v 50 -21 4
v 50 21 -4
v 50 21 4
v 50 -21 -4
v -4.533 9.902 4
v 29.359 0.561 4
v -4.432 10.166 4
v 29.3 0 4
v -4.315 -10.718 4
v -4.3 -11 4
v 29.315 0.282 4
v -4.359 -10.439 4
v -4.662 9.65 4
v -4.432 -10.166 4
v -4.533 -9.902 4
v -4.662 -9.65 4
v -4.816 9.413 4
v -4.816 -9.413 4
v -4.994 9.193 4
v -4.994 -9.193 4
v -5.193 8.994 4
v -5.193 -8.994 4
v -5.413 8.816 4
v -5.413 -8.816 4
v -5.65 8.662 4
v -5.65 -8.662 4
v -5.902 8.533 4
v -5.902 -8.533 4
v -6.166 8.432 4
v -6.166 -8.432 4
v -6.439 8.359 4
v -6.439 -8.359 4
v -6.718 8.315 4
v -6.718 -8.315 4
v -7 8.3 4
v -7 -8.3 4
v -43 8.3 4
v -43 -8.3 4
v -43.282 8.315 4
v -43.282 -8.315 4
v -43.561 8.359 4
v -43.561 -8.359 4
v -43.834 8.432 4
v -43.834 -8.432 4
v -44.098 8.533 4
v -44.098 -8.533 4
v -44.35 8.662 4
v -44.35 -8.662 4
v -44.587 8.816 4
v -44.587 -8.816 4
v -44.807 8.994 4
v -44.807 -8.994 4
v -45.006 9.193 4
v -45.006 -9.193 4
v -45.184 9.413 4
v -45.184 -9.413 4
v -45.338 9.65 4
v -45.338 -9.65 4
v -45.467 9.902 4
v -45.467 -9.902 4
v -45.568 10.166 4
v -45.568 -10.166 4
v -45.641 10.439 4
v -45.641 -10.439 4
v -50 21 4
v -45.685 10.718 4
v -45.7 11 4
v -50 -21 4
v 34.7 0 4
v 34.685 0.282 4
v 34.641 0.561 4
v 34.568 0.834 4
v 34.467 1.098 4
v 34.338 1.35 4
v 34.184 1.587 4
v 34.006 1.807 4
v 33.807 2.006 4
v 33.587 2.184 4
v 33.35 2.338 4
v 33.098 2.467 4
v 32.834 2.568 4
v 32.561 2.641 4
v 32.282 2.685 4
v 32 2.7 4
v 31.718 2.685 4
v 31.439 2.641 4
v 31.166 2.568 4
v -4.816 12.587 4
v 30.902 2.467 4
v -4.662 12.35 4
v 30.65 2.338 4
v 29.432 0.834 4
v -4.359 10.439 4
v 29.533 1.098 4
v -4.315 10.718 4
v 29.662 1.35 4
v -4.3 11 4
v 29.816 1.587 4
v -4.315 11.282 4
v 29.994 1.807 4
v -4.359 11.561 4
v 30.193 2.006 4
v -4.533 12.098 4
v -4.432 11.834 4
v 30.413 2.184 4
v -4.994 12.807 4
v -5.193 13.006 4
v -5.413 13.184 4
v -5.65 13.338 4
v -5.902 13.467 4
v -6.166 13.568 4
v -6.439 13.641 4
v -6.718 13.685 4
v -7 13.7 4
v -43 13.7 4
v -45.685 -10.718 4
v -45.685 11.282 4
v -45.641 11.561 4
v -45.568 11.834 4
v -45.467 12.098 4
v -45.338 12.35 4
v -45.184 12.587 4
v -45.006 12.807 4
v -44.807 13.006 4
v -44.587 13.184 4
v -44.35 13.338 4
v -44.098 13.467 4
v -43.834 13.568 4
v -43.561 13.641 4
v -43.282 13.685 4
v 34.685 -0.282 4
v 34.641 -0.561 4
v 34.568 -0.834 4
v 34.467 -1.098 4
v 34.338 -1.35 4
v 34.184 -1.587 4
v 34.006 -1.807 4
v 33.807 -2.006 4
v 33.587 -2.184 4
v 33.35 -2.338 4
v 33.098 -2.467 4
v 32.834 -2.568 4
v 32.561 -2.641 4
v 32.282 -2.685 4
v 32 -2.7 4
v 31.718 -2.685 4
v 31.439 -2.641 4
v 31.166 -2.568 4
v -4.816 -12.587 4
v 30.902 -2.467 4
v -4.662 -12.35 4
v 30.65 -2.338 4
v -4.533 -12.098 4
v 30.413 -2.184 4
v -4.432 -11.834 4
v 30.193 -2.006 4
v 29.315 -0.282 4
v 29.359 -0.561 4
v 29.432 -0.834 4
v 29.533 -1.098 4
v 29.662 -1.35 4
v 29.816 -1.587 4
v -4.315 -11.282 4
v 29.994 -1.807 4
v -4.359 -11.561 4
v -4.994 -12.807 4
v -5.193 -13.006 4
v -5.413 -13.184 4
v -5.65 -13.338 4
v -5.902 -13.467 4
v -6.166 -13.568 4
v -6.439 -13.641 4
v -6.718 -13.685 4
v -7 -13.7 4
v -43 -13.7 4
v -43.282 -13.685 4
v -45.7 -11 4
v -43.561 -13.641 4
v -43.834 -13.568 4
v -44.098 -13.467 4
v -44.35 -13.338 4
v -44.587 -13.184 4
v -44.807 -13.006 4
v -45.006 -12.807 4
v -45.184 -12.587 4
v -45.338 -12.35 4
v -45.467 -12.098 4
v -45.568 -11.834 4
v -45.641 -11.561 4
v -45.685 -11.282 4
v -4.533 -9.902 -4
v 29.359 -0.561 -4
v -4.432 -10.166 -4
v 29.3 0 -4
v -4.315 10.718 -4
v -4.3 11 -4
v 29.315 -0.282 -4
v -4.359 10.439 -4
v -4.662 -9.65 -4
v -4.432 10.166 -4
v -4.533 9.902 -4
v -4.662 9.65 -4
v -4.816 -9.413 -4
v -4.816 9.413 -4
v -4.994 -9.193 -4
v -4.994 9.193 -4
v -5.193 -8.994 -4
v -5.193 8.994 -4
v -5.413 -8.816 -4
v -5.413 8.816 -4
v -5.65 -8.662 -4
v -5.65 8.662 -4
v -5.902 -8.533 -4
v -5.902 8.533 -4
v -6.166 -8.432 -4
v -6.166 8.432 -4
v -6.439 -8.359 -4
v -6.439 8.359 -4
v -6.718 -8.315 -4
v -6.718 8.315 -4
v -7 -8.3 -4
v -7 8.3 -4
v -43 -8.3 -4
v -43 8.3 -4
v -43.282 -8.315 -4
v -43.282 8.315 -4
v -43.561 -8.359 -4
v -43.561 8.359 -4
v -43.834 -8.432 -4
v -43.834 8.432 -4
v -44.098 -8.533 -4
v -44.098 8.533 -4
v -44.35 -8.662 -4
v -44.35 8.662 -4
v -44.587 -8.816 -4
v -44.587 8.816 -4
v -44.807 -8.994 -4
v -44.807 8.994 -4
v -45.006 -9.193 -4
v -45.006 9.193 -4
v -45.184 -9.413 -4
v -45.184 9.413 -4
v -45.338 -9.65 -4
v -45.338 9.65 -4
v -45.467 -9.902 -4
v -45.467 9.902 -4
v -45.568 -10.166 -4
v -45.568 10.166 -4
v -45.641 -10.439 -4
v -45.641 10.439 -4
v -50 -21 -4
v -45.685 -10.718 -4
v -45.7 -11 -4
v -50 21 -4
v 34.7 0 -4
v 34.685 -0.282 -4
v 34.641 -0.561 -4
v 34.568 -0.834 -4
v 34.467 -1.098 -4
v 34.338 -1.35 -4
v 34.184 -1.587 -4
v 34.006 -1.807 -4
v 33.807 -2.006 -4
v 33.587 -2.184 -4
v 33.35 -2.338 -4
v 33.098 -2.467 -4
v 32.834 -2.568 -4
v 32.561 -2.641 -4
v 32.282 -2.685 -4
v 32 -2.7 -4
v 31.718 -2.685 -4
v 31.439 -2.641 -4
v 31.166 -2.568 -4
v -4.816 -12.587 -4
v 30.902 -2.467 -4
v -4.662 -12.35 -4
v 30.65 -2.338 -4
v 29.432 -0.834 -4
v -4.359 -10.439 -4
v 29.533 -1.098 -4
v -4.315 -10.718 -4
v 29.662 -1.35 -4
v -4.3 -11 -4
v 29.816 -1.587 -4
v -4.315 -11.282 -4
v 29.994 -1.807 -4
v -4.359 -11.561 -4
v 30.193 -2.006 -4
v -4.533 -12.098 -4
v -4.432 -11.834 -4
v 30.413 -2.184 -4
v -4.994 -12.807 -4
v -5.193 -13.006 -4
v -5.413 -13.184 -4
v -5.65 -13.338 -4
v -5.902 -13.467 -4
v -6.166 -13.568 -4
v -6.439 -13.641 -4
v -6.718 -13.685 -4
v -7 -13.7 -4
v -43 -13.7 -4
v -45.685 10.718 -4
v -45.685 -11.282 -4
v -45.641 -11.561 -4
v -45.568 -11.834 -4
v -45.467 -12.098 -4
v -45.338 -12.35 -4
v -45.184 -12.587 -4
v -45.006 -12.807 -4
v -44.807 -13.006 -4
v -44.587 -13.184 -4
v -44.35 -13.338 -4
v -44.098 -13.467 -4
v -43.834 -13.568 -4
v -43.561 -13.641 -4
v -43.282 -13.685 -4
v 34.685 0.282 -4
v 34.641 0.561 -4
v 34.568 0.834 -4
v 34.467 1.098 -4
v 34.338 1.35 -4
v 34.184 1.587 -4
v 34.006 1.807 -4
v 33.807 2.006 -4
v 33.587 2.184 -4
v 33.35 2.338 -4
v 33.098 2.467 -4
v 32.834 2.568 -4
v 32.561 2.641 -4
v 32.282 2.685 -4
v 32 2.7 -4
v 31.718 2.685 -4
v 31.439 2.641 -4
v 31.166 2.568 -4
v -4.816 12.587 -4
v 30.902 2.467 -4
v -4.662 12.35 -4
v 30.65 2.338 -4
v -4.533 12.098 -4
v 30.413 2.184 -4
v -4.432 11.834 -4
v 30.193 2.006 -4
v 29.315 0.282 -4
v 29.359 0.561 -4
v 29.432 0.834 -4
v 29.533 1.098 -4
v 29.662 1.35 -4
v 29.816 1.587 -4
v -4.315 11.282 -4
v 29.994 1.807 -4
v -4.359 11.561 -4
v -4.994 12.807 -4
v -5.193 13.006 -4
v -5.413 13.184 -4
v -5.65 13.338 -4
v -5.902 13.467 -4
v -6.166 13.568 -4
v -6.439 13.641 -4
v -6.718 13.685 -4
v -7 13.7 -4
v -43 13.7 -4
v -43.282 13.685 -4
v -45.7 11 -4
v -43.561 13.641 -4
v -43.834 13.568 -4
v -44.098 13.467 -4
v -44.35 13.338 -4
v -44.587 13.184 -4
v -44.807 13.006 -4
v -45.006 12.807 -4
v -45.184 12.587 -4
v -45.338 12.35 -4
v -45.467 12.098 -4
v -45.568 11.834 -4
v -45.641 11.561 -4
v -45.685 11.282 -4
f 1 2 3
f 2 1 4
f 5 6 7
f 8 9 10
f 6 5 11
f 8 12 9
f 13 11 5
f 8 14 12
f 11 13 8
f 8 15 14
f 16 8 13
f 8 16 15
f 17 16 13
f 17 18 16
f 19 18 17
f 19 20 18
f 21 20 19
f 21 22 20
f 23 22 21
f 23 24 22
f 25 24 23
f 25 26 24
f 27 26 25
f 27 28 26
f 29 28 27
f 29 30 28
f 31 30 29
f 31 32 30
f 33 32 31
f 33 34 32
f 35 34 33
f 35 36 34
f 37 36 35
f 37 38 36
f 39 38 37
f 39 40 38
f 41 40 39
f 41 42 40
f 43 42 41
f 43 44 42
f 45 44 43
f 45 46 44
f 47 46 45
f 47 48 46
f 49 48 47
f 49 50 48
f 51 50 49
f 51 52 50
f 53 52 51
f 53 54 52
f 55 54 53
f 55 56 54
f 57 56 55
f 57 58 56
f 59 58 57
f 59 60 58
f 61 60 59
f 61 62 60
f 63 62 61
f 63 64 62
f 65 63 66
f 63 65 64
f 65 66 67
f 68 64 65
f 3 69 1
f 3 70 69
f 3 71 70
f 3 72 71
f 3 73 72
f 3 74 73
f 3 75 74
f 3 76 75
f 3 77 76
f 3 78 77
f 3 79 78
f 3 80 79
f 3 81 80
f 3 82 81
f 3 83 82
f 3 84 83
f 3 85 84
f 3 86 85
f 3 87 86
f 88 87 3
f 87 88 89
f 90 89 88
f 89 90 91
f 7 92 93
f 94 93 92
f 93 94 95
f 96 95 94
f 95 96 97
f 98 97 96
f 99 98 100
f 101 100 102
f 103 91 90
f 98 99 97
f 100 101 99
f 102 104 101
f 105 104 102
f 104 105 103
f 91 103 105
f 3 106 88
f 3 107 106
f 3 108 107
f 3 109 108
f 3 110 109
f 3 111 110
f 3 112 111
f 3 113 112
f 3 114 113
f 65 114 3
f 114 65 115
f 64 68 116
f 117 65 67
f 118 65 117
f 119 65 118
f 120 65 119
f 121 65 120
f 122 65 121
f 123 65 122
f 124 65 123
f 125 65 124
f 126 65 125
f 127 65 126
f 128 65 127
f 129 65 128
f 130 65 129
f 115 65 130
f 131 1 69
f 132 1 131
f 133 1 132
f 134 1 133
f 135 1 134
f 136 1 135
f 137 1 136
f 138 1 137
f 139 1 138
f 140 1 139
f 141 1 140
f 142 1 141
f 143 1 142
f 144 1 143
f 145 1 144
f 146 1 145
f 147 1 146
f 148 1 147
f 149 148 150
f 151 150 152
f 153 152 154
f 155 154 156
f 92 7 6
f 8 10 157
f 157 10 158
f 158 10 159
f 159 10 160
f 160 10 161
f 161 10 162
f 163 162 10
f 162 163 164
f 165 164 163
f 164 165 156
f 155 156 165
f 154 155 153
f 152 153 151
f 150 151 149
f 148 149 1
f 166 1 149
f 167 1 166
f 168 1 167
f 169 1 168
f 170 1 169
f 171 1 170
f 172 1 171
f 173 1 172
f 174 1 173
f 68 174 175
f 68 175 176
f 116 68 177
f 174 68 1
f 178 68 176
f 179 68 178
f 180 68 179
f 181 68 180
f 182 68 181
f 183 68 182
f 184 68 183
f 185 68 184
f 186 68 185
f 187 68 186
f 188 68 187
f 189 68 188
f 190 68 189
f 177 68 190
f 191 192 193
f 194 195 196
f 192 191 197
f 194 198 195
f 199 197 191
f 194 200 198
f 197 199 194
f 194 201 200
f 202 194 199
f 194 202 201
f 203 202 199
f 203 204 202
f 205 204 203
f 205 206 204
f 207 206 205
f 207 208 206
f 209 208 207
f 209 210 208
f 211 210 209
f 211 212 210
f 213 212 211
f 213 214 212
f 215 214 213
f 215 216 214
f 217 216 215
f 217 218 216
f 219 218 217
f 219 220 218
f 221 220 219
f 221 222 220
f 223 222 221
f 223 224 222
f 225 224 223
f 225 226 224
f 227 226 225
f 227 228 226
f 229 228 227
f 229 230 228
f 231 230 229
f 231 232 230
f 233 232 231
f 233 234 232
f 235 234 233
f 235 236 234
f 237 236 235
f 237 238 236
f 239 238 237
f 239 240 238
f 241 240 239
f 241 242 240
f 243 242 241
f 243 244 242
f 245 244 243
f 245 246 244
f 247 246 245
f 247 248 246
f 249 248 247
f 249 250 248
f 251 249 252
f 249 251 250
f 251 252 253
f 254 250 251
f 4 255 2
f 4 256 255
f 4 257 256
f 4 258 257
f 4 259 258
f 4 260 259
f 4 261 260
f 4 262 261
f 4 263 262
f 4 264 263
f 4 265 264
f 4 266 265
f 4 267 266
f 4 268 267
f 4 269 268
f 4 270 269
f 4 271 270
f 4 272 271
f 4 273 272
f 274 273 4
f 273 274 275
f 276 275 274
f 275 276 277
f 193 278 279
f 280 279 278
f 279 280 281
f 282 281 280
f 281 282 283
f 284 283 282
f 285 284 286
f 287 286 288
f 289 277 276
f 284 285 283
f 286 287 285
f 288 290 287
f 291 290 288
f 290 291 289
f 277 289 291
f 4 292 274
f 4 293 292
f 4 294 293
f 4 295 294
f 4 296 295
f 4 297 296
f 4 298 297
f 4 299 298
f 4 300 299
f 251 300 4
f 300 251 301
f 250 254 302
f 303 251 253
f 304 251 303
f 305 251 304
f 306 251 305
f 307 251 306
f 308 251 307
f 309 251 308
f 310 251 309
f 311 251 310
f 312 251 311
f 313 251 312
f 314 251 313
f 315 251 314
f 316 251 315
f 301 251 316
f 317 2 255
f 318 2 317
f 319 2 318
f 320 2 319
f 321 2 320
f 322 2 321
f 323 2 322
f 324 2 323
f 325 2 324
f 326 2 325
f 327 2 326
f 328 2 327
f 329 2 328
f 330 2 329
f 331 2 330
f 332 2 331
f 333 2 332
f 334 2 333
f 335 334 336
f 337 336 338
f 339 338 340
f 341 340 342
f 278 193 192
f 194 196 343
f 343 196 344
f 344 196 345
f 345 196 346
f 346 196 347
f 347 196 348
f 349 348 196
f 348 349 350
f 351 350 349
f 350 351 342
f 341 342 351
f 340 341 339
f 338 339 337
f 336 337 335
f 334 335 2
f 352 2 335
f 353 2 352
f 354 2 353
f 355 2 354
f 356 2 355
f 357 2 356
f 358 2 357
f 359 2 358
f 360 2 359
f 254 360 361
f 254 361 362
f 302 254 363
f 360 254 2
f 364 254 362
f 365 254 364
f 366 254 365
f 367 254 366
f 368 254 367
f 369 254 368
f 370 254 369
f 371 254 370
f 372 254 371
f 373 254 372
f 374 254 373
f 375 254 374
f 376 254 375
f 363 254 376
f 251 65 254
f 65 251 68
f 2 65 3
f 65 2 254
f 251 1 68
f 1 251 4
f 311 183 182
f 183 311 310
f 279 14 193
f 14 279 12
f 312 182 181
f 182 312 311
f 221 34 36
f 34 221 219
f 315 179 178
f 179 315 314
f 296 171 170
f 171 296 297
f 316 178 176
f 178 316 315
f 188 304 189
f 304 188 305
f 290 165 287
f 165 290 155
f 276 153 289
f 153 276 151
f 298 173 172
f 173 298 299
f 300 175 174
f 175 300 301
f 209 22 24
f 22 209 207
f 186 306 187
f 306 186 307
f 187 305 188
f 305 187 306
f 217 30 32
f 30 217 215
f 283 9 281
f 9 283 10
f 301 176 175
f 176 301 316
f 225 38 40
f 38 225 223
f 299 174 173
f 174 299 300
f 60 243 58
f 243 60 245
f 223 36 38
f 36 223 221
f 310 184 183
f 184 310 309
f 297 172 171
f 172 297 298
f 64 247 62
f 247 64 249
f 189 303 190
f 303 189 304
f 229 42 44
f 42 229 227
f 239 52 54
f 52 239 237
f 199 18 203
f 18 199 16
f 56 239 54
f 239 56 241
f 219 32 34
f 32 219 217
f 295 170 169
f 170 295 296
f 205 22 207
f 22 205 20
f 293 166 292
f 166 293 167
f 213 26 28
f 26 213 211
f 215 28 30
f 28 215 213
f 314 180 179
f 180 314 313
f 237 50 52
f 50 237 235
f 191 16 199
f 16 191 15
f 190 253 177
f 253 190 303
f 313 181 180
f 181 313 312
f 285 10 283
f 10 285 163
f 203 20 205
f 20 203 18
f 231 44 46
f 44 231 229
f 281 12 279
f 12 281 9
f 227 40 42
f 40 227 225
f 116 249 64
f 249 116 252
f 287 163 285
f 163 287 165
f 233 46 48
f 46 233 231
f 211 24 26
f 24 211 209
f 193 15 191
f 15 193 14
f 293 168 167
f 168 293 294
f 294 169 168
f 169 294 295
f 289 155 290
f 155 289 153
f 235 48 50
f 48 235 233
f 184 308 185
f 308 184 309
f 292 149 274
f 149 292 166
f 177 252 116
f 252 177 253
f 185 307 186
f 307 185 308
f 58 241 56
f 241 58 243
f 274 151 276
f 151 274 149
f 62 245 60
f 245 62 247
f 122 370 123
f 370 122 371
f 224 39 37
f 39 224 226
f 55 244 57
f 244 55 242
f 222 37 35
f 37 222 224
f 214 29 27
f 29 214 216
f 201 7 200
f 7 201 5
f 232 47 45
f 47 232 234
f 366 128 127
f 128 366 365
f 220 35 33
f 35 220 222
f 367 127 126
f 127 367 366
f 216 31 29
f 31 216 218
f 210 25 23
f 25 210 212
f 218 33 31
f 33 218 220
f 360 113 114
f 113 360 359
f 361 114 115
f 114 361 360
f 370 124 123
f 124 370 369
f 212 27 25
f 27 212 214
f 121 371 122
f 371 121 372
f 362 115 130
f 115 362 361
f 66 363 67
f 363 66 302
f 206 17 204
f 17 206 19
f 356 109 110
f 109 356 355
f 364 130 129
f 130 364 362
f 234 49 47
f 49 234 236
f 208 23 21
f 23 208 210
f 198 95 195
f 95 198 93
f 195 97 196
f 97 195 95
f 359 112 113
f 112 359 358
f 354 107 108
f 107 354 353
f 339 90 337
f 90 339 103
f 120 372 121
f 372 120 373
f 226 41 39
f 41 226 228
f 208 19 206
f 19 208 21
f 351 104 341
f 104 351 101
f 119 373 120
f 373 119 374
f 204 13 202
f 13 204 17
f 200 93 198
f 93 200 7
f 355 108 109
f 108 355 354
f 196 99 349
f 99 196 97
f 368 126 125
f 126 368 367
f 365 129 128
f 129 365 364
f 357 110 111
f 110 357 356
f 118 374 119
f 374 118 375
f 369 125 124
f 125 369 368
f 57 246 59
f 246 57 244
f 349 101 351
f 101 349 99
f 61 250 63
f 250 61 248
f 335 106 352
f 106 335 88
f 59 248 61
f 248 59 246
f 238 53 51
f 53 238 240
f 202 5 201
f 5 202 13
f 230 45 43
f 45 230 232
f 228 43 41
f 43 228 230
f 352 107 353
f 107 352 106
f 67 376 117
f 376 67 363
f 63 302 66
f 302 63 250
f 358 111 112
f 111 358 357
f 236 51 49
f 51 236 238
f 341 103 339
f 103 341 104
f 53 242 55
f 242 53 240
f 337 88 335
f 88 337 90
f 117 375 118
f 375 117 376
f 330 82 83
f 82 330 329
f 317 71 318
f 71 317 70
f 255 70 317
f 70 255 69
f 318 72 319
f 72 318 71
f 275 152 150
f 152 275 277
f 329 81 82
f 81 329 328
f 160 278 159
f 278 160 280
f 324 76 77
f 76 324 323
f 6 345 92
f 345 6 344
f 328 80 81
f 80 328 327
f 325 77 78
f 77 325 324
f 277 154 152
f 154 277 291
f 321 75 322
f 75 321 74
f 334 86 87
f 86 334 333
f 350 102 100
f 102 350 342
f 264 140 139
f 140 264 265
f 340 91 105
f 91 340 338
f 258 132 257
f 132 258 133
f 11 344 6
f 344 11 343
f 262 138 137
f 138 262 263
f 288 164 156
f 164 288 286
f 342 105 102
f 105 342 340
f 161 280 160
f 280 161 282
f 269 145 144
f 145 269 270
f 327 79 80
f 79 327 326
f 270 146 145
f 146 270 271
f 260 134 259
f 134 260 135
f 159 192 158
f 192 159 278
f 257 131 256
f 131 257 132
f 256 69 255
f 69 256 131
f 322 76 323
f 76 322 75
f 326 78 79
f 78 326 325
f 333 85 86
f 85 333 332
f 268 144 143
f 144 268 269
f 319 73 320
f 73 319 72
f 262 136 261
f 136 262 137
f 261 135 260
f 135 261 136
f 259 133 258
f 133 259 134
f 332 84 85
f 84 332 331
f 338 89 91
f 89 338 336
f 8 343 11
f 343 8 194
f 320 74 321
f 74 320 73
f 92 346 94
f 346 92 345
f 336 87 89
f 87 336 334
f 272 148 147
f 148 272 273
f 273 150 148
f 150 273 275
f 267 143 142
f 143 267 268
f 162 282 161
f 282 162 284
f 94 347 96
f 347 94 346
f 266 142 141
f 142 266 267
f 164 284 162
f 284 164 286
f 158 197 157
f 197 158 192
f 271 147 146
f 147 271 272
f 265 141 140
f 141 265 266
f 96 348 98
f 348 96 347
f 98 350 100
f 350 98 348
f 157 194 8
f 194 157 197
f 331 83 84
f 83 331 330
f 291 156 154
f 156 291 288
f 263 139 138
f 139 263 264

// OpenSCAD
// GT2 idler tensioner slide for 9 mm belt.
$fn = 60;
eps = 0.02;
slide_l = 100;
slide_w = 42;
slide_t = 8;
belt_w = 9;
slot_l = 36;
axle_d = 5.4;
axle_x = slide_l / 2 - 18;
module slot(y) {
    hull() {
        translate([-slide_l / 4 - slot_l / 2, y, -slide_t / 2 - eps]) cylinder(d = 5.4, h = slide_t + 2 * eps);
        translate([-slide_l / 4 + slot_l / 2, y, -slide_t / 2 - eps]) cylinder(d = 5.4, h = slide_t + 2 * eps);
    }
}
difference() {
    cube([slide_l, slide_w, slide_t], center = true);
    slot(-11);
    slot(11);
    translate([axle_x, 0, -slide_t / 2 - eps]) cylinder(d = axle_d, h = slide_t + 2 * eps);
}
